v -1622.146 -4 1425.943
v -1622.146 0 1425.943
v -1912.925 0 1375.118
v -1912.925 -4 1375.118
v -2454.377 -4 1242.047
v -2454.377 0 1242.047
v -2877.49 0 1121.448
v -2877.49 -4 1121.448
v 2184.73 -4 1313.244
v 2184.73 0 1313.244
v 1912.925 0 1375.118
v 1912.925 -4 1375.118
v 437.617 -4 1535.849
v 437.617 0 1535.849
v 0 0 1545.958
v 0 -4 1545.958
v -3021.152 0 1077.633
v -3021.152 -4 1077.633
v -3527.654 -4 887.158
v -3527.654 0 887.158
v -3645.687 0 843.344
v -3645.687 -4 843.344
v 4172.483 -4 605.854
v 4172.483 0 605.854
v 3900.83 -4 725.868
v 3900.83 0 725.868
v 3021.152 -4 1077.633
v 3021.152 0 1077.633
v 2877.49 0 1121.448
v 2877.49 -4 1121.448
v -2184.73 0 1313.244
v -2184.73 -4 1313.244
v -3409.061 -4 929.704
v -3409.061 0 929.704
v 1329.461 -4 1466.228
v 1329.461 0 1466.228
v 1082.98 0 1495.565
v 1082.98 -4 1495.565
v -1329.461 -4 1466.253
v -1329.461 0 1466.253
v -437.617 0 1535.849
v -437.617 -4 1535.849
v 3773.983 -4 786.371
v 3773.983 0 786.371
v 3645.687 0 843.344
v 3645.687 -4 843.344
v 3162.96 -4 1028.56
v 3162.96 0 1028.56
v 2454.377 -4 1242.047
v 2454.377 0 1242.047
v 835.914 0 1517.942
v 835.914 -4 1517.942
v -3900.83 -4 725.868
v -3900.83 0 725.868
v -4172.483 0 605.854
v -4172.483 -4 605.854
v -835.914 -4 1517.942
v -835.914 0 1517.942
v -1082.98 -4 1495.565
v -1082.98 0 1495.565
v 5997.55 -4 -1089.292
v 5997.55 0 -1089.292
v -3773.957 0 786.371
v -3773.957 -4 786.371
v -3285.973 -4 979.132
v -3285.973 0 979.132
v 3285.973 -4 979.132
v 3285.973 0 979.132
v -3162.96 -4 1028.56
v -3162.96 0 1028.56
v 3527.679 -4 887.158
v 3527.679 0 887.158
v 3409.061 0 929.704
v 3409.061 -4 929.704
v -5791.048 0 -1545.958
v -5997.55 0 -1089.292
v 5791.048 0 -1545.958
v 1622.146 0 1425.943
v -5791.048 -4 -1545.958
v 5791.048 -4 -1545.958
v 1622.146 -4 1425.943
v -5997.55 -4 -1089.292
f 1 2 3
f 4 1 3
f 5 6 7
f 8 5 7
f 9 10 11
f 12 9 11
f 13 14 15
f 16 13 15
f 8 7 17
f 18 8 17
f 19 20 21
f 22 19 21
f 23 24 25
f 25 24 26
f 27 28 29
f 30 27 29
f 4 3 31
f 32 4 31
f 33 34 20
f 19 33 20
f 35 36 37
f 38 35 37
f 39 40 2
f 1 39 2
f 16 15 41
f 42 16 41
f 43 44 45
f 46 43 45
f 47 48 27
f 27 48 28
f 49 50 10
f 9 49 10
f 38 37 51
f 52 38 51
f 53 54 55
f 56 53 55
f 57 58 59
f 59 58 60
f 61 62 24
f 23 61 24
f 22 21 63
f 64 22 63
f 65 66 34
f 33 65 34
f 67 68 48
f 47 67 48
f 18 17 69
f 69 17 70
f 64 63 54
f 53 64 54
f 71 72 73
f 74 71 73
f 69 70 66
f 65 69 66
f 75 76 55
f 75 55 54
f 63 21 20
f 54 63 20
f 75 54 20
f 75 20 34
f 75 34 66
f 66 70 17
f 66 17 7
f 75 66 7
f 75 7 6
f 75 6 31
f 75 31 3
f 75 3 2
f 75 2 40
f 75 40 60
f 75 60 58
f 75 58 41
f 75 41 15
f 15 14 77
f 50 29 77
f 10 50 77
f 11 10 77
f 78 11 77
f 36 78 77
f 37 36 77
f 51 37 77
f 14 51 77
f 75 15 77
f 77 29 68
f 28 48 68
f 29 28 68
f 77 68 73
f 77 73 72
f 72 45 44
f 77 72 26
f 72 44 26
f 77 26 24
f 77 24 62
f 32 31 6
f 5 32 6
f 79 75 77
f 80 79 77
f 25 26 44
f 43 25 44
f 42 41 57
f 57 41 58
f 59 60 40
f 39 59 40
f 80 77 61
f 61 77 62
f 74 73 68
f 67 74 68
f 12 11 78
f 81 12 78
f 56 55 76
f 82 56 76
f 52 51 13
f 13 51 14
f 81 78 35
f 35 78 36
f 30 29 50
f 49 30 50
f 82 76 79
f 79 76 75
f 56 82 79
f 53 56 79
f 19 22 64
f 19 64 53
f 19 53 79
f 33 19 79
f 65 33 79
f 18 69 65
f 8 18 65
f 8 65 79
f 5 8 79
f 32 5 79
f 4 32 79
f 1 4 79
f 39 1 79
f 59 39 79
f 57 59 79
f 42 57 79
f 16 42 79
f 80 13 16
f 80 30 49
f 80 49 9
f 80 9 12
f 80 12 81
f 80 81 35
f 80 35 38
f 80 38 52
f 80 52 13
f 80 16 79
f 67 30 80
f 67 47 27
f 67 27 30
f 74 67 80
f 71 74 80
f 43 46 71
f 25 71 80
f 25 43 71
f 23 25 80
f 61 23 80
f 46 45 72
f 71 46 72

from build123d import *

# Parameters (mm, degrees)
F1_DEPTH = 4


with BuildPart() as f1:
    # F0 (on Front) → F1 (new body)
    with BuildSketch(Plane.XZ):
        Polygon((437.6166, 1535.8491), (0, 1545.9583), (-437.6166, 1535.8491), (-835.914, 1517.9421), (-1082.9798, 1495.5647), (-1329.4614, 1466.2531), (-1622.1456, 1425.9433), (-1912.9248, 1375.1179), (-2184.7302, 1313.2435), (-2454.3766, 1242.0473), (-2877.4898, 1121.4481), (-3021.1522, 1077.6331), (-3162.9604, 1028.5603), (-3285.9726, 979.1319), (-3409.061, 929.7035), (-3527.6536, 887.1585), (-3645.6874, 843.3435), (-3773.9574, 786.3713), (-3900.8304, 725.8685), (-4172.4834, 605.8535), (-5997.5496, -1089.2917), (-5791.0476, -1545.9583), (0, -1545.9583), (5791.0476, -1545.9583), (5997.5496, -1089.2917), (4172.4834, 605.8535), (3900.8304, 725.8685), (3773.9828, 786.3713), (3645.6874, 843.3435), (3527.679, 887.1585), (3409.061, 929.7035), (3285.9726, 979.1319), (3162.9604, 1028.5603), (3021.1522, 1077.6331), (2877.4898, 1121.4481), (2454.3766, 1242.0473), (2184.7302, 1313.2435), (1912.9248, 1375.1179), (1622.1456, 1425.9433), (1329.4614, 1466.2277), (1082.9798, 1495.5647), (835.914, 1517.9421), align=None)
    extrude(amount=F1_DEPTH)


solid = f1.part
